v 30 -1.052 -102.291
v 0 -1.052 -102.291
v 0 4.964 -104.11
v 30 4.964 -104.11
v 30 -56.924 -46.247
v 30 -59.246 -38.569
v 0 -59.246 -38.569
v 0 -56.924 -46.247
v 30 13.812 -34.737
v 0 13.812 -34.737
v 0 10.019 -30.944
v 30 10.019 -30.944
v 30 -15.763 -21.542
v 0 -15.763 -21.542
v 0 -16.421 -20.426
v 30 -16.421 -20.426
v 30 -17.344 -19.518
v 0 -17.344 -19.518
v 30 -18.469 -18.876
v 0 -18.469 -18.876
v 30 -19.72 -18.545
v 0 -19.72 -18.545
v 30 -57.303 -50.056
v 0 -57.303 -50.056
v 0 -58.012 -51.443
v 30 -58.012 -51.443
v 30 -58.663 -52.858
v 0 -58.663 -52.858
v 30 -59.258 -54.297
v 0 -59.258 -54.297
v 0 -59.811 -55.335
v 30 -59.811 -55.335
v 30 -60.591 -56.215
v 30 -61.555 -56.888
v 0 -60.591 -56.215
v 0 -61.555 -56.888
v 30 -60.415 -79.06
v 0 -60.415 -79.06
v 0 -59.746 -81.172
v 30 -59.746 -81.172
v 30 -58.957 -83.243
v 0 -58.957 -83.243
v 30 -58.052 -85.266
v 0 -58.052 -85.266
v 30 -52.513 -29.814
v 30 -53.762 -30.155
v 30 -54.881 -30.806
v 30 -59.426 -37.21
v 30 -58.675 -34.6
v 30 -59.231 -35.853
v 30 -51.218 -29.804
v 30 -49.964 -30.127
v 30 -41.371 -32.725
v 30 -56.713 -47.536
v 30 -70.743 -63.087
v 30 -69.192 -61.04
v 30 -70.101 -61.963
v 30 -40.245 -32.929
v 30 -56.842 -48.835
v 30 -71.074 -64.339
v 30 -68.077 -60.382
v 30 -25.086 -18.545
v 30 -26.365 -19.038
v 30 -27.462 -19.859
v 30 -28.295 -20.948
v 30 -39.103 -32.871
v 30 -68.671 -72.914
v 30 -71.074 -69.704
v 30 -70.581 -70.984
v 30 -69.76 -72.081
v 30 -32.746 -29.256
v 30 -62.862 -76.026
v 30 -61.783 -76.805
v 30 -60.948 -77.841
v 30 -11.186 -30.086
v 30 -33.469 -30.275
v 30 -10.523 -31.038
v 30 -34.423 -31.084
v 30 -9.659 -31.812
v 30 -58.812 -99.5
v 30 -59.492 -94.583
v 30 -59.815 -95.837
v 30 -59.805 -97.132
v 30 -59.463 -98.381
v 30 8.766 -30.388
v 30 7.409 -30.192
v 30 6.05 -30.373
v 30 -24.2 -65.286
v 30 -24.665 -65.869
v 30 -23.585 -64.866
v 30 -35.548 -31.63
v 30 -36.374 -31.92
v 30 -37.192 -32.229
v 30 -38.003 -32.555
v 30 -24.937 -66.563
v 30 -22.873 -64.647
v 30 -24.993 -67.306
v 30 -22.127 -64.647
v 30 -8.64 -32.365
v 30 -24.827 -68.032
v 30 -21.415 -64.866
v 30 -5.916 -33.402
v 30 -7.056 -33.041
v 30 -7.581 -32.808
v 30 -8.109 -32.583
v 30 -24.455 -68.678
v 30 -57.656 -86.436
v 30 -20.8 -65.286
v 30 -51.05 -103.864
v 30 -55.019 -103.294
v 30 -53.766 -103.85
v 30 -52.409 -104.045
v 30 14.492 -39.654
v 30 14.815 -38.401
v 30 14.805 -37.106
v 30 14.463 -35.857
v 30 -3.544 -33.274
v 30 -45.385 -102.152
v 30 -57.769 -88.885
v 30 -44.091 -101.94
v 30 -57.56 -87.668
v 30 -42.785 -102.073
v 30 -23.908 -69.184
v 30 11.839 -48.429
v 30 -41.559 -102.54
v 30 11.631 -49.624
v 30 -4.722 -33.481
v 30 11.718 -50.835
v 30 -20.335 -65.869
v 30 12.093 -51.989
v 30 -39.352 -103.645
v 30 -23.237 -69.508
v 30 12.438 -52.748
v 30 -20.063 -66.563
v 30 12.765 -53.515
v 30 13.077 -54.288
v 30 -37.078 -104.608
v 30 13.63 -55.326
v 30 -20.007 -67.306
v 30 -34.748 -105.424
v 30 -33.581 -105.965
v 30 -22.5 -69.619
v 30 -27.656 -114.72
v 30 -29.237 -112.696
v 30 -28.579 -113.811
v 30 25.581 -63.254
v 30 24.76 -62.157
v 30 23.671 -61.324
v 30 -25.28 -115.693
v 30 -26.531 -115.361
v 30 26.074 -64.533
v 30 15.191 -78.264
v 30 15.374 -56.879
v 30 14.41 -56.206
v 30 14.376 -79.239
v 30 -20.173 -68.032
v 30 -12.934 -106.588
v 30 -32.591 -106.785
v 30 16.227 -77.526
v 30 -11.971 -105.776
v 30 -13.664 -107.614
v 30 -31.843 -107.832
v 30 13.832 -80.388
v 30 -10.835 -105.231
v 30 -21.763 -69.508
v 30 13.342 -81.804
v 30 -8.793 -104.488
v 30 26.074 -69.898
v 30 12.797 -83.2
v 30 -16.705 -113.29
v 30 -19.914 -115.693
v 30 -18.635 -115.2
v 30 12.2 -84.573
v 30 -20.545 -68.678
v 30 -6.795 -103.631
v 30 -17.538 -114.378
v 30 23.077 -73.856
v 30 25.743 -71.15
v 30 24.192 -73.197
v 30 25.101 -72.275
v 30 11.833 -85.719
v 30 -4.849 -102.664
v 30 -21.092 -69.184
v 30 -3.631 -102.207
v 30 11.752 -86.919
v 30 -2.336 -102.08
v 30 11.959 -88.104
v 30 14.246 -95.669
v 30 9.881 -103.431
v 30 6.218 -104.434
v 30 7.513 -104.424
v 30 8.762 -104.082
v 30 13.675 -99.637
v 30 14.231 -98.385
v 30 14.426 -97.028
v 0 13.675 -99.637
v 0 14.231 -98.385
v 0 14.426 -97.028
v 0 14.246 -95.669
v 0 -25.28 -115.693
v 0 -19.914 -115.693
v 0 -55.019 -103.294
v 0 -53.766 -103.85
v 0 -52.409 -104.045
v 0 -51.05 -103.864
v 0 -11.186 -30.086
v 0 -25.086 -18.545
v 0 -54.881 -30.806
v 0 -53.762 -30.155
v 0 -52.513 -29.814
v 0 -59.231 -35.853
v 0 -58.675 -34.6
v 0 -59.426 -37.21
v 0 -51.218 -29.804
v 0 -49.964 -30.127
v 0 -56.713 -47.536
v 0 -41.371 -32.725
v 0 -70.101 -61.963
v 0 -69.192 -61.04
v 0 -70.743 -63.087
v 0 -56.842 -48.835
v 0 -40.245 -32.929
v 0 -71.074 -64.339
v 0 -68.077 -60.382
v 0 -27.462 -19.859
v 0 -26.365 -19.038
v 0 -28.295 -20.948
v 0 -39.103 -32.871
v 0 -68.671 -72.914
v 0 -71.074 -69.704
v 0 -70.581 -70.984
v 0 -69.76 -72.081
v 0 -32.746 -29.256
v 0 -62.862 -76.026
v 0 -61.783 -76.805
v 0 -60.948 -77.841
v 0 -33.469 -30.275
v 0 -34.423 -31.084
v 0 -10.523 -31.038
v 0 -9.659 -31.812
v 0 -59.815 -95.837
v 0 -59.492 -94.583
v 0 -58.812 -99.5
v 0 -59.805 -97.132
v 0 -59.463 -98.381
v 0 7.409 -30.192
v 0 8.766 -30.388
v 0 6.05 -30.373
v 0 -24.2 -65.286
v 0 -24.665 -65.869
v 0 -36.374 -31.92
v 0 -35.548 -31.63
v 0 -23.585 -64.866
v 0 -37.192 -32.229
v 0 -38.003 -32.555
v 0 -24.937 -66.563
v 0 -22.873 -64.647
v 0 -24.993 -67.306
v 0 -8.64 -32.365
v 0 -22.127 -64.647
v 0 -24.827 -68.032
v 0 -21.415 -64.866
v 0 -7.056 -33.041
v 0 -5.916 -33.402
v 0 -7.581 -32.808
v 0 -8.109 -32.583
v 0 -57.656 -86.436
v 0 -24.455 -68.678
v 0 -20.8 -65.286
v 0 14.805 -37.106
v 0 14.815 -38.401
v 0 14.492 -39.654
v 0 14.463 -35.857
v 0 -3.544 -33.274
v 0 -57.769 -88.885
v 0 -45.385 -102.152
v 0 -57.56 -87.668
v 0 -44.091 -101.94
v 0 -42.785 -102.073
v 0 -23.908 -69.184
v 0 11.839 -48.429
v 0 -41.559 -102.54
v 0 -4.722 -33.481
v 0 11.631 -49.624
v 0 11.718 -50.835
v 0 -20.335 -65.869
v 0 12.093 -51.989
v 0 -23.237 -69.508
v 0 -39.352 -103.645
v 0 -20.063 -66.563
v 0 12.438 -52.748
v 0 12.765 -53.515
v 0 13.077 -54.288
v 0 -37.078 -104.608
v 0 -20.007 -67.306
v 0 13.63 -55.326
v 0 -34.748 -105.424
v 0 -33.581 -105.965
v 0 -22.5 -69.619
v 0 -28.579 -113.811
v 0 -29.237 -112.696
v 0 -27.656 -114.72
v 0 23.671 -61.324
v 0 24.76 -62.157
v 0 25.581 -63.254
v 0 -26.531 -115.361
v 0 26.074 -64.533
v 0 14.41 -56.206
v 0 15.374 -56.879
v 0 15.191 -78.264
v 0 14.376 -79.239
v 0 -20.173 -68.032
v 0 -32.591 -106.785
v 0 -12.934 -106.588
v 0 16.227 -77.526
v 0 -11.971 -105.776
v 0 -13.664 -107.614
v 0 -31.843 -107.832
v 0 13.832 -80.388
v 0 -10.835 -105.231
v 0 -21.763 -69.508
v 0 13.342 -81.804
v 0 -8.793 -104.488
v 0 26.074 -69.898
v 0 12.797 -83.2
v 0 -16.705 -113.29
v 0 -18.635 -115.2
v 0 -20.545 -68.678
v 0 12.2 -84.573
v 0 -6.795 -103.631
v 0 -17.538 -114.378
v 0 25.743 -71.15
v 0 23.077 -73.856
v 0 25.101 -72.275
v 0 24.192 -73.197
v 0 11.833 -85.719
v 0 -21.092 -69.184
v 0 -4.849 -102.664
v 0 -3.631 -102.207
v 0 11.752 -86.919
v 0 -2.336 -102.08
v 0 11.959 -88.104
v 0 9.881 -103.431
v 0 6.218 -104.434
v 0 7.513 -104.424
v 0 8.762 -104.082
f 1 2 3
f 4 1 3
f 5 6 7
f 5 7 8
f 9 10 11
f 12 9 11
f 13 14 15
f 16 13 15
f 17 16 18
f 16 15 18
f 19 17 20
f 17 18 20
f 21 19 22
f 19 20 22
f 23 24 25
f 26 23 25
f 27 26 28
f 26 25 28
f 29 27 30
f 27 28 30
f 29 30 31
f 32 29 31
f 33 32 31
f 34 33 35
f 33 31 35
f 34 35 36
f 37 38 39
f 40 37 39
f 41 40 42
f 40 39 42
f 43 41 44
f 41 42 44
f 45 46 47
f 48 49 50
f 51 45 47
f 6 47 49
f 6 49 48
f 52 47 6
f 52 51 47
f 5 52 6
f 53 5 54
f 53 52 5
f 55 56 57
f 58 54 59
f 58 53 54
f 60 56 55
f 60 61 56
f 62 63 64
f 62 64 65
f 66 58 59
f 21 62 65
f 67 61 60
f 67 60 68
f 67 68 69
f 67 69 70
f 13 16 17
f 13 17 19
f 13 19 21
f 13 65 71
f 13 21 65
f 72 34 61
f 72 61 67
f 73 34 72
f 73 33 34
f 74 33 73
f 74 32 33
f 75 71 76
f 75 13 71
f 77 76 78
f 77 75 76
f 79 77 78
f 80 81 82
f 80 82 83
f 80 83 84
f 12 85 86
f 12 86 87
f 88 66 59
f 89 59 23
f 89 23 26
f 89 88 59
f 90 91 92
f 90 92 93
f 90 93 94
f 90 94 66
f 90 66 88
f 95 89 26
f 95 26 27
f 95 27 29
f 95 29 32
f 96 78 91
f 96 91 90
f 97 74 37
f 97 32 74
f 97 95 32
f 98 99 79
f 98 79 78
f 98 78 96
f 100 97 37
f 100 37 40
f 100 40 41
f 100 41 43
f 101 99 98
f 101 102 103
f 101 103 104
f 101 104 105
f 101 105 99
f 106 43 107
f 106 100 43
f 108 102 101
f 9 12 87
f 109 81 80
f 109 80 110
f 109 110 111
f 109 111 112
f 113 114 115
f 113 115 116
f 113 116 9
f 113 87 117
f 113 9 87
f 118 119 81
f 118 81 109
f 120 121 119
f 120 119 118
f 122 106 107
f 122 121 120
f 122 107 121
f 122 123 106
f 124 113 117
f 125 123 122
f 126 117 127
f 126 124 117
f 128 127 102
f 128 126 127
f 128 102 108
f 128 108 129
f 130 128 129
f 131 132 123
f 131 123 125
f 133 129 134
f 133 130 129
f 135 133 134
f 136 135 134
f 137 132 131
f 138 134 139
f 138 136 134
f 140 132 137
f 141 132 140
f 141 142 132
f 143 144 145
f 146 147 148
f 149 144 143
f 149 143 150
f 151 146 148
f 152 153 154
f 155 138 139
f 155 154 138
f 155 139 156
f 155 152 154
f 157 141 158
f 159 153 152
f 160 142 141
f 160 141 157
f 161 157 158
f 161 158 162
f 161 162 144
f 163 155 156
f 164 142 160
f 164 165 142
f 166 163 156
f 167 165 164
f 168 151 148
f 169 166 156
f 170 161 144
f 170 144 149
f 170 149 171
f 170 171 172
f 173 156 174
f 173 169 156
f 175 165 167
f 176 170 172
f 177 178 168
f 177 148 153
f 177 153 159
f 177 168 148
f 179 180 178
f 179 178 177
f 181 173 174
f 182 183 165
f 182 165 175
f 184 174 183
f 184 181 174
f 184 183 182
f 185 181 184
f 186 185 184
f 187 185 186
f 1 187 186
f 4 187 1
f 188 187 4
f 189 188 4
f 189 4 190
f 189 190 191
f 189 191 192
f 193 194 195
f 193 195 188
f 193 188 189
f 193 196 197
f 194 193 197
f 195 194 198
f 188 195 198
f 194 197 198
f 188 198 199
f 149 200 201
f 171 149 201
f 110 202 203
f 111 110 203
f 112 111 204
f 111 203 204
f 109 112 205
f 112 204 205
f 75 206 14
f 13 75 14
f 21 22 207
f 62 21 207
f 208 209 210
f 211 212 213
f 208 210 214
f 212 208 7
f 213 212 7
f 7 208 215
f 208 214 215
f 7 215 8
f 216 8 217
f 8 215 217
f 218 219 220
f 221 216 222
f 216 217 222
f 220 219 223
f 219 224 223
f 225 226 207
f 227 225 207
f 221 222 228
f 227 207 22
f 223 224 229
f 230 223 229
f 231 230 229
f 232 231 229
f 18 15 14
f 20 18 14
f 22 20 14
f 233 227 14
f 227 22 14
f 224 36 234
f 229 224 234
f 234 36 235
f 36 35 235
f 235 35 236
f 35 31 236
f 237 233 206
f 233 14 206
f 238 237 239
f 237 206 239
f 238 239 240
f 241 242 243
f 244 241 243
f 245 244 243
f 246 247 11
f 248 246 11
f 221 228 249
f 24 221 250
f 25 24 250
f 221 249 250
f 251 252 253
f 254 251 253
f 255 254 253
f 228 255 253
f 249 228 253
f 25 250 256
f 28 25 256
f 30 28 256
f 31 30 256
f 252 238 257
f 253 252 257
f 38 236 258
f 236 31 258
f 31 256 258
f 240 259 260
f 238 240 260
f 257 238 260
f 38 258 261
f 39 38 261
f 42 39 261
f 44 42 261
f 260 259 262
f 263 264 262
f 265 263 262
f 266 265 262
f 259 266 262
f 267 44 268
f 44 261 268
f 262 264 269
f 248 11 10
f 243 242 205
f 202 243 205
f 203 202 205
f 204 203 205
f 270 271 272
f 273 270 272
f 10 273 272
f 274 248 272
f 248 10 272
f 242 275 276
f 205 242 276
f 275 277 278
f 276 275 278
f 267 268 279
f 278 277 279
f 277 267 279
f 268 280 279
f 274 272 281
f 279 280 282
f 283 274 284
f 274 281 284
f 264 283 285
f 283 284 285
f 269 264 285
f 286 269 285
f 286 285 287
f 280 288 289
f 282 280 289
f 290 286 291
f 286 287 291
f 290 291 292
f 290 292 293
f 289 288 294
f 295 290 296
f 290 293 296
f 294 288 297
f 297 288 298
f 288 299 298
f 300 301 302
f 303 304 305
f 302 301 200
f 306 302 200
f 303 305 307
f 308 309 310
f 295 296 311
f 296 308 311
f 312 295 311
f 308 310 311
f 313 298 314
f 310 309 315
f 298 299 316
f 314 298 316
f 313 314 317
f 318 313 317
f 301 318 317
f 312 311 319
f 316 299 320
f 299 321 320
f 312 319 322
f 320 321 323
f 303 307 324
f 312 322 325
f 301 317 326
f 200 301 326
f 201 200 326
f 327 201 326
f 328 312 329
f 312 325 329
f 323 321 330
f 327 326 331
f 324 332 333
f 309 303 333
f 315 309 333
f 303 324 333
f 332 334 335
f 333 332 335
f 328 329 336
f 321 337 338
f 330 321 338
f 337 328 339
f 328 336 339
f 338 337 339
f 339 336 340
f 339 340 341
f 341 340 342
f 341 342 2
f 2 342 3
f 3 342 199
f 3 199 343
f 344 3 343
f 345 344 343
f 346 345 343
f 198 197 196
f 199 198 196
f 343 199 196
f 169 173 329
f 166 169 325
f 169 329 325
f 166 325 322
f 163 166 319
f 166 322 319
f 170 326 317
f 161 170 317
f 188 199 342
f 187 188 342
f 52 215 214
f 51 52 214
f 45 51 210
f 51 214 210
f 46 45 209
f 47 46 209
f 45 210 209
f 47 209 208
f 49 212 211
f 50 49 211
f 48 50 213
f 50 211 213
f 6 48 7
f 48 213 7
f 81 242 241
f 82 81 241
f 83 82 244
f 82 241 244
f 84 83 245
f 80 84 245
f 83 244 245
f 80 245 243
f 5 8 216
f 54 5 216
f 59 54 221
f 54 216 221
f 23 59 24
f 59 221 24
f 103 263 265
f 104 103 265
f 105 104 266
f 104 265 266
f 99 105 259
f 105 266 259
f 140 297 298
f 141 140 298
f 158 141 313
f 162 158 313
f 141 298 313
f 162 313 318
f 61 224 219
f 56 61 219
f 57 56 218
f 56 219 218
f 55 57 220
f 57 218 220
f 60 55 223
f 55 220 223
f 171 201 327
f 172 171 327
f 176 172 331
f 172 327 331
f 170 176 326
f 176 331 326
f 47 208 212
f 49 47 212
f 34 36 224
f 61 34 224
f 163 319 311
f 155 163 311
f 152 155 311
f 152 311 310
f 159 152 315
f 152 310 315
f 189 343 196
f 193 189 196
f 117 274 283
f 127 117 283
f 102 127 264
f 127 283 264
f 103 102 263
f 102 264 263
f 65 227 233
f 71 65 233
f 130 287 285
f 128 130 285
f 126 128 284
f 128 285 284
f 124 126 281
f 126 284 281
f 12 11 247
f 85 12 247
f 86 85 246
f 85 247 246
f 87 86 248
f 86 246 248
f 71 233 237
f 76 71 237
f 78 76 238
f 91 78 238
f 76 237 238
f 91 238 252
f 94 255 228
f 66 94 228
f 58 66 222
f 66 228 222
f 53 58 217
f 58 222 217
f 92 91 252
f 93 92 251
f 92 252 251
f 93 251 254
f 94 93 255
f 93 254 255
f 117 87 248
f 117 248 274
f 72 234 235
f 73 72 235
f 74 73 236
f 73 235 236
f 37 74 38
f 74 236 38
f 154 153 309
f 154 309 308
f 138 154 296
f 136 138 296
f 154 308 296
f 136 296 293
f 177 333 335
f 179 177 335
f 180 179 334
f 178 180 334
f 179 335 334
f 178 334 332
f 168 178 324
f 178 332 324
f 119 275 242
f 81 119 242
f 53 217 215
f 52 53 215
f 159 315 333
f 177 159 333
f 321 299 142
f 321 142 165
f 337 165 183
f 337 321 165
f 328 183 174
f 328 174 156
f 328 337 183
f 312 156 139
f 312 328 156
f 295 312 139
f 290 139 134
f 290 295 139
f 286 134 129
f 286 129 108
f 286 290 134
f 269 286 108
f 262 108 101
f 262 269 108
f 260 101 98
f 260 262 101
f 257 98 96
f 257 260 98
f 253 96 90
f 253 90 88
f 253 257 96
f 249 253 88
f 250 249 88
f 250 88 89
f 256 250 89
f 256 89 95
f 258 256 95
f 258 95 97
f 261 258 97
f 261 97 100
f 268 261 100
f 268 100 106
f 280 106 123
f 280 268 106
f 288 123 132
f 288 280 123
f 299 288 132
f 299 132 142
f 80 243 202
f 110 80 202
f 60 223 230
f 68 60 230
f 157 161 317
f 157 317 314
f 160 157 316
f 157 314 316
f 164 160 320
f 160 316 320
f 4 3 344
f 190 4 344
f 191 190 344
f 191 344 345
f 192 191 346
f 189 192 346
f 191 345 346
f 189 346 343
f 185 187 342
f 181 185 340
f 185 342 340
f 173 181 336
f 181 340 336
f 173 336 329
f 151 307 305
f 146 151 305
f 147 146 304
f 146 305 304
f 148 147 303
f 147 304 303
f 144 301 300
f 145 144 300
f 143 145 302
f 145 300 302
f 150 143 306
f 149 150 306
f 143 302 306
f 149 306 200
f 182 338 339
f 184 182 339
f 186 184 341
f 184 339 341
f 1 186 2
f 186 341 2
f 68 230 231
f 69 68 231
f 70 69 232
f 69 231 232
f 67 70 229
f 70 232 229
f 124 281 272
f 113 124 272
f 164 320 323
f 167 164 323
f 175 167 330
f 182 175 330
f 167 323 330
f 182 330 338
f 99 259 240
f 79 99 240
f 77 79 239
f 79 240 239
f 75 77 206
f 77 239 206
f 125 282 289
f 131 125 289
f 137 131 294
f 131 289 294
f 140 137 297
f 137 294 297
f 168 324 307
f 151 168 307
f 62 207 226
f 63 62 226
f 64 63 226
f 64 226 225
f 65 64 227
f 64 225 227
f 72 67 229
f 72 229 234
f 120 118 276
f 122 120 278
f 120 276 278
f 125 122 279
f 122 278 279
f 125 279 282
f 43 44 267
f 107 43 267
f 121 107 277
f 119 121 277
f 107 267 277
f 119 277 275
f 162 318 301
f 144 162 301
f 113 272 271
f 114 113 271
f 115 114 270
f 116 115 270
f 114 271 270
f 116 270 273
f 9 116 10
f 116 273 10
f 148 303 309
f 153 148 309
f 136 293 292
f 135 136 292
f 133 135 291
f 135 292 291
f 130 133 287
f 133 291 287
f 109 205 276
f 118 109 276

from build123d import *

# Parameters (mm, degrees)
SKETCH2_R           = 2.5
BOSS_EXTRUDE2_DEPTH = 30


with BuildPart() as part:
    # Sketch2 → Boss-Extrude2 (new body)
    with BuildSketch(Plane(origin=(0, 0, 0), x_dir=(0, 0, -1), z_dir=(1, 0, 0))):
        with BuildLine():
            Line((30.085747665, -11.186099671), (21.541651222, -15.763294195))
            ThreePointArc((21.541651222, -15.763294195), (19.517636628, -17.343724655), (18.545040528, -19.720371945))
            Line((18.545040528, -19.720371945), (18.545040528, -25.085535704))
            ThreePointArc((18.545040528, -25.085535704), (19.410646287, -26.94173637), (20.947854528, -28.295156137))
            Line((20.947854528, -28.295156137), (29.255531223, -32.745697224))
            ThreePointArc((29.255531223, -32.745697224), (30.70940007, -33.921076219), (31.629897073, -35.548324102))
            ThreePointArc((31.629897073, -35.548324102), (32.071931866, -36.783630966), (32.555458455, -38.00329479))
            ThreePointArc((32.555458455, -38.00329479), (32.932855534, -39.672508554), (32.725254973, -41.37121546))
            Line((32.725254973, -41.37121546), (30.127327196, -49.964361184))
            ThreePointArc((30.127327196, -49.964361184), (29.813665847, -52.513088724), (30.806479965, -54.881361437))
            Line((30.806479965, -54.881361437), (34.600223641, -58.675105113))
            ThreePointArc((34.600223641, -58.675105113), (36.524831421, -59.37556149), (38.568814087, -59.245603413))
            Line((38.568814087, -59.245603413), (46.247135524, -56.924250421))
            ThreePointArc((46.247135524, -56.924250421), (48.189416877, -56.734903616), (50.056242855, -57.303471848))
            ThreePointArc((50.056242855, -57.303471848), (52.14714523, -58.344514128), (54.296872356, -59.257922611))
            ThreePointArc((54.296872356, -59.257922611), (55.797855342, -60.175122269), (56.888305405, -61.555384489))
            Line((56.888305405, -61.555384489), (60.38212329, -68.077177874))
            ThreePointArc((60.38212329, -68.077177874), (61.96255375, -70.101192468), (64.339201041, -71.073788567))
            Line((64.339201041, -71.073788567), (69.7043648, -71.073788567))
            ThreePointArc((69.7043648, -71.073788567), (71.560565466, -70.208182809), (72.913985233, -68.670974568))
            Line((72.913985233, -68.670974568), (76.025985896, -62.861906663))
            ThreePointArc((76.025985896, -62.861906663), (77.294737312, -61.33085674), (79.059877782, -60.415366082))
            ThreePointArc((79.059877782, -60.415366082), (82.213367183, -59.366491991), (85.265589491, -58.05174059))
            ThreePointArc((85.265589491, -58.05174059), (87.048884387, -57.57014809), (88.885340547, -57.768896167))
            Line((88.885340547, -57.768896167), (94.58319028, -59.4915019))
            ThreePointArc((94.58319028, -59.4915019), (97.13191782, -59.805163248), (99.500190533, -58.812349131))
            Line((99.500190533, -58.812349131), (103.293934209, -55.018605455))
            ThreePointArc((103.293934209, -55.018605455), (103.994390585, -53.093997675), (103.864432509, -51.050015008))
            Line((103.864432509, -51.050015008), (102.151862248, -45.385359528))
            ThreePointArc((102.151862248, -45.385359528), (101.963471996, -43.433562355), (102.540152369, -41.559411123))
            ThreePointArc((102.540152369, -41.559411123), (104.144447245, -38.22268307), (105.423574244, -34.748298193))
            ThreePointArc((105.423574244, -34.748298193), (106.342936692, -33.05955411), (107.831618895, -31.842627988))
            Line((107.831618895, -31.842627988), (112.696006969, -29.236705805))
            ThreePointArc((112.696006969, -29.236705805), (114.720021563, -27.656275345), (115.692617663, -25.279628055))
            Line((115.692617663, -25.279628055), (115.692617663, -19.914464296))
            ThreePointArc((115.692617663, -19.914464296), (114.827011904, -18.05826363), (113.289803663, -16.704843863))
            Line((113.289803663, -16.704843863), (107.614484835, -13.664494491))
            ThreePointArc((107.614484835, -13.664494491), (106.151590865, -12.478432267), (105.231215931, -10.835352127))
            ThreePointArc((105.231215931, -10.835352127), (104.073253902, -7.788047033), (102.663702949, -4.848640544))
            ThreePointArc((102.663702949, -4.848640544), (102.101264993, -2.987400021), (102.291326141, -1.05234718))
            Line((102.291326141, -1.05234718), (104.110330995, 4.964361184))
            ThreePointArc((104.110330995, 4.964361184), (104.423992344, 7.513088724), (103.431178226, 9.881361437))
            Line((103.431178226, 9.881361437), (99.63743455, 13.675105113))
            ThreePointArc((99.63743455, 13.675105113), (97.71282677, 14.375561489), (95.668844104, 14.245603413))
            Line((95.668844104, 14.245603413), (88.104104481, 11.958589109))
            ThreePointArc((88.104104481, 11.958589109), (86.316773657, 11.75624578), (84.573495165, 12.199500102))
            ThreePointArc((84.573495165, 12.199500102), (82.504544688, 13.07643575), (80.388319531, 13.832189213))
            ThreePointArc((80.388319531, 13.832189213), (78.725157037, 14.752239447), (77.525530925, 16.22651863))
            Line((77.525530925, 16.22651863), (73.855534901, 23.077177874))
            ThreePointArc((73.855534901, 23.077177874), (72.275104441, 25.101192468), (69.89845715, 26.073788567))
            Line((69.89845715, 26.073788567), (64.533293391, 26.073788567))
            ThreePointArc((64.533293391, 26.073788567), (62.677092726, 25.208182809), (61.323672958, 23.670974568))
            Line((61.323672958, 23.670974568), (56.878792468, 15.373864318))
            ThreePointArc((56.878792468, 15.373864318), (55.788778276, 13.99398857), (54.288444878, 13.076825711))
            ThreePointArc((54.288444878, 13.076825711), (53.130789266, 12.603622826), (51.988977307, 12.093374908))
            ThreePointArc((51.988977307, 12.093374908), (50.232381905, 11.637586716), (48.428806148, 11.838794991))
            Line((48.428806148, 11.838794991), (39.654467911, 14.4915019))
            ThreePointArc((39.654467911, 14.4915019), (37.105740371, 14.805163248), (34.737467658, 13.812349131))
            Line((34.737467658, 13.812349131), (30.943723982, 10.018605455))
            ThreePointArc((30.943723982, 10.018605455), (30.243267606, 8.093997675), (30.373225682, 6.050015008))
            Line((30.373225682, 6.050015008), (33.27387934, -3.544454783))
            ThreePointArc((33.27387934, -3.544454783), (33.476910751, -5.321546901), (33.041482883, -7.056390042))
            ThreePointArc((33.041482883, -7.056390042), (32.694654044, -7.844321785), (32.365382945, -8.639750737))
            ThreePointArc((32.365382945, -8.639750737), (31.449885158, -10.113748997), (30.085747665, -11.186099671))
        make_face()
        with Locations((67.118829096, -22.5)):
            Circle(SKETCH2_R, mode=Mode.SUBTRACT)
    extrude(amount=BOSS_EXTRUDE2_DEPTH)


solid = part.part
